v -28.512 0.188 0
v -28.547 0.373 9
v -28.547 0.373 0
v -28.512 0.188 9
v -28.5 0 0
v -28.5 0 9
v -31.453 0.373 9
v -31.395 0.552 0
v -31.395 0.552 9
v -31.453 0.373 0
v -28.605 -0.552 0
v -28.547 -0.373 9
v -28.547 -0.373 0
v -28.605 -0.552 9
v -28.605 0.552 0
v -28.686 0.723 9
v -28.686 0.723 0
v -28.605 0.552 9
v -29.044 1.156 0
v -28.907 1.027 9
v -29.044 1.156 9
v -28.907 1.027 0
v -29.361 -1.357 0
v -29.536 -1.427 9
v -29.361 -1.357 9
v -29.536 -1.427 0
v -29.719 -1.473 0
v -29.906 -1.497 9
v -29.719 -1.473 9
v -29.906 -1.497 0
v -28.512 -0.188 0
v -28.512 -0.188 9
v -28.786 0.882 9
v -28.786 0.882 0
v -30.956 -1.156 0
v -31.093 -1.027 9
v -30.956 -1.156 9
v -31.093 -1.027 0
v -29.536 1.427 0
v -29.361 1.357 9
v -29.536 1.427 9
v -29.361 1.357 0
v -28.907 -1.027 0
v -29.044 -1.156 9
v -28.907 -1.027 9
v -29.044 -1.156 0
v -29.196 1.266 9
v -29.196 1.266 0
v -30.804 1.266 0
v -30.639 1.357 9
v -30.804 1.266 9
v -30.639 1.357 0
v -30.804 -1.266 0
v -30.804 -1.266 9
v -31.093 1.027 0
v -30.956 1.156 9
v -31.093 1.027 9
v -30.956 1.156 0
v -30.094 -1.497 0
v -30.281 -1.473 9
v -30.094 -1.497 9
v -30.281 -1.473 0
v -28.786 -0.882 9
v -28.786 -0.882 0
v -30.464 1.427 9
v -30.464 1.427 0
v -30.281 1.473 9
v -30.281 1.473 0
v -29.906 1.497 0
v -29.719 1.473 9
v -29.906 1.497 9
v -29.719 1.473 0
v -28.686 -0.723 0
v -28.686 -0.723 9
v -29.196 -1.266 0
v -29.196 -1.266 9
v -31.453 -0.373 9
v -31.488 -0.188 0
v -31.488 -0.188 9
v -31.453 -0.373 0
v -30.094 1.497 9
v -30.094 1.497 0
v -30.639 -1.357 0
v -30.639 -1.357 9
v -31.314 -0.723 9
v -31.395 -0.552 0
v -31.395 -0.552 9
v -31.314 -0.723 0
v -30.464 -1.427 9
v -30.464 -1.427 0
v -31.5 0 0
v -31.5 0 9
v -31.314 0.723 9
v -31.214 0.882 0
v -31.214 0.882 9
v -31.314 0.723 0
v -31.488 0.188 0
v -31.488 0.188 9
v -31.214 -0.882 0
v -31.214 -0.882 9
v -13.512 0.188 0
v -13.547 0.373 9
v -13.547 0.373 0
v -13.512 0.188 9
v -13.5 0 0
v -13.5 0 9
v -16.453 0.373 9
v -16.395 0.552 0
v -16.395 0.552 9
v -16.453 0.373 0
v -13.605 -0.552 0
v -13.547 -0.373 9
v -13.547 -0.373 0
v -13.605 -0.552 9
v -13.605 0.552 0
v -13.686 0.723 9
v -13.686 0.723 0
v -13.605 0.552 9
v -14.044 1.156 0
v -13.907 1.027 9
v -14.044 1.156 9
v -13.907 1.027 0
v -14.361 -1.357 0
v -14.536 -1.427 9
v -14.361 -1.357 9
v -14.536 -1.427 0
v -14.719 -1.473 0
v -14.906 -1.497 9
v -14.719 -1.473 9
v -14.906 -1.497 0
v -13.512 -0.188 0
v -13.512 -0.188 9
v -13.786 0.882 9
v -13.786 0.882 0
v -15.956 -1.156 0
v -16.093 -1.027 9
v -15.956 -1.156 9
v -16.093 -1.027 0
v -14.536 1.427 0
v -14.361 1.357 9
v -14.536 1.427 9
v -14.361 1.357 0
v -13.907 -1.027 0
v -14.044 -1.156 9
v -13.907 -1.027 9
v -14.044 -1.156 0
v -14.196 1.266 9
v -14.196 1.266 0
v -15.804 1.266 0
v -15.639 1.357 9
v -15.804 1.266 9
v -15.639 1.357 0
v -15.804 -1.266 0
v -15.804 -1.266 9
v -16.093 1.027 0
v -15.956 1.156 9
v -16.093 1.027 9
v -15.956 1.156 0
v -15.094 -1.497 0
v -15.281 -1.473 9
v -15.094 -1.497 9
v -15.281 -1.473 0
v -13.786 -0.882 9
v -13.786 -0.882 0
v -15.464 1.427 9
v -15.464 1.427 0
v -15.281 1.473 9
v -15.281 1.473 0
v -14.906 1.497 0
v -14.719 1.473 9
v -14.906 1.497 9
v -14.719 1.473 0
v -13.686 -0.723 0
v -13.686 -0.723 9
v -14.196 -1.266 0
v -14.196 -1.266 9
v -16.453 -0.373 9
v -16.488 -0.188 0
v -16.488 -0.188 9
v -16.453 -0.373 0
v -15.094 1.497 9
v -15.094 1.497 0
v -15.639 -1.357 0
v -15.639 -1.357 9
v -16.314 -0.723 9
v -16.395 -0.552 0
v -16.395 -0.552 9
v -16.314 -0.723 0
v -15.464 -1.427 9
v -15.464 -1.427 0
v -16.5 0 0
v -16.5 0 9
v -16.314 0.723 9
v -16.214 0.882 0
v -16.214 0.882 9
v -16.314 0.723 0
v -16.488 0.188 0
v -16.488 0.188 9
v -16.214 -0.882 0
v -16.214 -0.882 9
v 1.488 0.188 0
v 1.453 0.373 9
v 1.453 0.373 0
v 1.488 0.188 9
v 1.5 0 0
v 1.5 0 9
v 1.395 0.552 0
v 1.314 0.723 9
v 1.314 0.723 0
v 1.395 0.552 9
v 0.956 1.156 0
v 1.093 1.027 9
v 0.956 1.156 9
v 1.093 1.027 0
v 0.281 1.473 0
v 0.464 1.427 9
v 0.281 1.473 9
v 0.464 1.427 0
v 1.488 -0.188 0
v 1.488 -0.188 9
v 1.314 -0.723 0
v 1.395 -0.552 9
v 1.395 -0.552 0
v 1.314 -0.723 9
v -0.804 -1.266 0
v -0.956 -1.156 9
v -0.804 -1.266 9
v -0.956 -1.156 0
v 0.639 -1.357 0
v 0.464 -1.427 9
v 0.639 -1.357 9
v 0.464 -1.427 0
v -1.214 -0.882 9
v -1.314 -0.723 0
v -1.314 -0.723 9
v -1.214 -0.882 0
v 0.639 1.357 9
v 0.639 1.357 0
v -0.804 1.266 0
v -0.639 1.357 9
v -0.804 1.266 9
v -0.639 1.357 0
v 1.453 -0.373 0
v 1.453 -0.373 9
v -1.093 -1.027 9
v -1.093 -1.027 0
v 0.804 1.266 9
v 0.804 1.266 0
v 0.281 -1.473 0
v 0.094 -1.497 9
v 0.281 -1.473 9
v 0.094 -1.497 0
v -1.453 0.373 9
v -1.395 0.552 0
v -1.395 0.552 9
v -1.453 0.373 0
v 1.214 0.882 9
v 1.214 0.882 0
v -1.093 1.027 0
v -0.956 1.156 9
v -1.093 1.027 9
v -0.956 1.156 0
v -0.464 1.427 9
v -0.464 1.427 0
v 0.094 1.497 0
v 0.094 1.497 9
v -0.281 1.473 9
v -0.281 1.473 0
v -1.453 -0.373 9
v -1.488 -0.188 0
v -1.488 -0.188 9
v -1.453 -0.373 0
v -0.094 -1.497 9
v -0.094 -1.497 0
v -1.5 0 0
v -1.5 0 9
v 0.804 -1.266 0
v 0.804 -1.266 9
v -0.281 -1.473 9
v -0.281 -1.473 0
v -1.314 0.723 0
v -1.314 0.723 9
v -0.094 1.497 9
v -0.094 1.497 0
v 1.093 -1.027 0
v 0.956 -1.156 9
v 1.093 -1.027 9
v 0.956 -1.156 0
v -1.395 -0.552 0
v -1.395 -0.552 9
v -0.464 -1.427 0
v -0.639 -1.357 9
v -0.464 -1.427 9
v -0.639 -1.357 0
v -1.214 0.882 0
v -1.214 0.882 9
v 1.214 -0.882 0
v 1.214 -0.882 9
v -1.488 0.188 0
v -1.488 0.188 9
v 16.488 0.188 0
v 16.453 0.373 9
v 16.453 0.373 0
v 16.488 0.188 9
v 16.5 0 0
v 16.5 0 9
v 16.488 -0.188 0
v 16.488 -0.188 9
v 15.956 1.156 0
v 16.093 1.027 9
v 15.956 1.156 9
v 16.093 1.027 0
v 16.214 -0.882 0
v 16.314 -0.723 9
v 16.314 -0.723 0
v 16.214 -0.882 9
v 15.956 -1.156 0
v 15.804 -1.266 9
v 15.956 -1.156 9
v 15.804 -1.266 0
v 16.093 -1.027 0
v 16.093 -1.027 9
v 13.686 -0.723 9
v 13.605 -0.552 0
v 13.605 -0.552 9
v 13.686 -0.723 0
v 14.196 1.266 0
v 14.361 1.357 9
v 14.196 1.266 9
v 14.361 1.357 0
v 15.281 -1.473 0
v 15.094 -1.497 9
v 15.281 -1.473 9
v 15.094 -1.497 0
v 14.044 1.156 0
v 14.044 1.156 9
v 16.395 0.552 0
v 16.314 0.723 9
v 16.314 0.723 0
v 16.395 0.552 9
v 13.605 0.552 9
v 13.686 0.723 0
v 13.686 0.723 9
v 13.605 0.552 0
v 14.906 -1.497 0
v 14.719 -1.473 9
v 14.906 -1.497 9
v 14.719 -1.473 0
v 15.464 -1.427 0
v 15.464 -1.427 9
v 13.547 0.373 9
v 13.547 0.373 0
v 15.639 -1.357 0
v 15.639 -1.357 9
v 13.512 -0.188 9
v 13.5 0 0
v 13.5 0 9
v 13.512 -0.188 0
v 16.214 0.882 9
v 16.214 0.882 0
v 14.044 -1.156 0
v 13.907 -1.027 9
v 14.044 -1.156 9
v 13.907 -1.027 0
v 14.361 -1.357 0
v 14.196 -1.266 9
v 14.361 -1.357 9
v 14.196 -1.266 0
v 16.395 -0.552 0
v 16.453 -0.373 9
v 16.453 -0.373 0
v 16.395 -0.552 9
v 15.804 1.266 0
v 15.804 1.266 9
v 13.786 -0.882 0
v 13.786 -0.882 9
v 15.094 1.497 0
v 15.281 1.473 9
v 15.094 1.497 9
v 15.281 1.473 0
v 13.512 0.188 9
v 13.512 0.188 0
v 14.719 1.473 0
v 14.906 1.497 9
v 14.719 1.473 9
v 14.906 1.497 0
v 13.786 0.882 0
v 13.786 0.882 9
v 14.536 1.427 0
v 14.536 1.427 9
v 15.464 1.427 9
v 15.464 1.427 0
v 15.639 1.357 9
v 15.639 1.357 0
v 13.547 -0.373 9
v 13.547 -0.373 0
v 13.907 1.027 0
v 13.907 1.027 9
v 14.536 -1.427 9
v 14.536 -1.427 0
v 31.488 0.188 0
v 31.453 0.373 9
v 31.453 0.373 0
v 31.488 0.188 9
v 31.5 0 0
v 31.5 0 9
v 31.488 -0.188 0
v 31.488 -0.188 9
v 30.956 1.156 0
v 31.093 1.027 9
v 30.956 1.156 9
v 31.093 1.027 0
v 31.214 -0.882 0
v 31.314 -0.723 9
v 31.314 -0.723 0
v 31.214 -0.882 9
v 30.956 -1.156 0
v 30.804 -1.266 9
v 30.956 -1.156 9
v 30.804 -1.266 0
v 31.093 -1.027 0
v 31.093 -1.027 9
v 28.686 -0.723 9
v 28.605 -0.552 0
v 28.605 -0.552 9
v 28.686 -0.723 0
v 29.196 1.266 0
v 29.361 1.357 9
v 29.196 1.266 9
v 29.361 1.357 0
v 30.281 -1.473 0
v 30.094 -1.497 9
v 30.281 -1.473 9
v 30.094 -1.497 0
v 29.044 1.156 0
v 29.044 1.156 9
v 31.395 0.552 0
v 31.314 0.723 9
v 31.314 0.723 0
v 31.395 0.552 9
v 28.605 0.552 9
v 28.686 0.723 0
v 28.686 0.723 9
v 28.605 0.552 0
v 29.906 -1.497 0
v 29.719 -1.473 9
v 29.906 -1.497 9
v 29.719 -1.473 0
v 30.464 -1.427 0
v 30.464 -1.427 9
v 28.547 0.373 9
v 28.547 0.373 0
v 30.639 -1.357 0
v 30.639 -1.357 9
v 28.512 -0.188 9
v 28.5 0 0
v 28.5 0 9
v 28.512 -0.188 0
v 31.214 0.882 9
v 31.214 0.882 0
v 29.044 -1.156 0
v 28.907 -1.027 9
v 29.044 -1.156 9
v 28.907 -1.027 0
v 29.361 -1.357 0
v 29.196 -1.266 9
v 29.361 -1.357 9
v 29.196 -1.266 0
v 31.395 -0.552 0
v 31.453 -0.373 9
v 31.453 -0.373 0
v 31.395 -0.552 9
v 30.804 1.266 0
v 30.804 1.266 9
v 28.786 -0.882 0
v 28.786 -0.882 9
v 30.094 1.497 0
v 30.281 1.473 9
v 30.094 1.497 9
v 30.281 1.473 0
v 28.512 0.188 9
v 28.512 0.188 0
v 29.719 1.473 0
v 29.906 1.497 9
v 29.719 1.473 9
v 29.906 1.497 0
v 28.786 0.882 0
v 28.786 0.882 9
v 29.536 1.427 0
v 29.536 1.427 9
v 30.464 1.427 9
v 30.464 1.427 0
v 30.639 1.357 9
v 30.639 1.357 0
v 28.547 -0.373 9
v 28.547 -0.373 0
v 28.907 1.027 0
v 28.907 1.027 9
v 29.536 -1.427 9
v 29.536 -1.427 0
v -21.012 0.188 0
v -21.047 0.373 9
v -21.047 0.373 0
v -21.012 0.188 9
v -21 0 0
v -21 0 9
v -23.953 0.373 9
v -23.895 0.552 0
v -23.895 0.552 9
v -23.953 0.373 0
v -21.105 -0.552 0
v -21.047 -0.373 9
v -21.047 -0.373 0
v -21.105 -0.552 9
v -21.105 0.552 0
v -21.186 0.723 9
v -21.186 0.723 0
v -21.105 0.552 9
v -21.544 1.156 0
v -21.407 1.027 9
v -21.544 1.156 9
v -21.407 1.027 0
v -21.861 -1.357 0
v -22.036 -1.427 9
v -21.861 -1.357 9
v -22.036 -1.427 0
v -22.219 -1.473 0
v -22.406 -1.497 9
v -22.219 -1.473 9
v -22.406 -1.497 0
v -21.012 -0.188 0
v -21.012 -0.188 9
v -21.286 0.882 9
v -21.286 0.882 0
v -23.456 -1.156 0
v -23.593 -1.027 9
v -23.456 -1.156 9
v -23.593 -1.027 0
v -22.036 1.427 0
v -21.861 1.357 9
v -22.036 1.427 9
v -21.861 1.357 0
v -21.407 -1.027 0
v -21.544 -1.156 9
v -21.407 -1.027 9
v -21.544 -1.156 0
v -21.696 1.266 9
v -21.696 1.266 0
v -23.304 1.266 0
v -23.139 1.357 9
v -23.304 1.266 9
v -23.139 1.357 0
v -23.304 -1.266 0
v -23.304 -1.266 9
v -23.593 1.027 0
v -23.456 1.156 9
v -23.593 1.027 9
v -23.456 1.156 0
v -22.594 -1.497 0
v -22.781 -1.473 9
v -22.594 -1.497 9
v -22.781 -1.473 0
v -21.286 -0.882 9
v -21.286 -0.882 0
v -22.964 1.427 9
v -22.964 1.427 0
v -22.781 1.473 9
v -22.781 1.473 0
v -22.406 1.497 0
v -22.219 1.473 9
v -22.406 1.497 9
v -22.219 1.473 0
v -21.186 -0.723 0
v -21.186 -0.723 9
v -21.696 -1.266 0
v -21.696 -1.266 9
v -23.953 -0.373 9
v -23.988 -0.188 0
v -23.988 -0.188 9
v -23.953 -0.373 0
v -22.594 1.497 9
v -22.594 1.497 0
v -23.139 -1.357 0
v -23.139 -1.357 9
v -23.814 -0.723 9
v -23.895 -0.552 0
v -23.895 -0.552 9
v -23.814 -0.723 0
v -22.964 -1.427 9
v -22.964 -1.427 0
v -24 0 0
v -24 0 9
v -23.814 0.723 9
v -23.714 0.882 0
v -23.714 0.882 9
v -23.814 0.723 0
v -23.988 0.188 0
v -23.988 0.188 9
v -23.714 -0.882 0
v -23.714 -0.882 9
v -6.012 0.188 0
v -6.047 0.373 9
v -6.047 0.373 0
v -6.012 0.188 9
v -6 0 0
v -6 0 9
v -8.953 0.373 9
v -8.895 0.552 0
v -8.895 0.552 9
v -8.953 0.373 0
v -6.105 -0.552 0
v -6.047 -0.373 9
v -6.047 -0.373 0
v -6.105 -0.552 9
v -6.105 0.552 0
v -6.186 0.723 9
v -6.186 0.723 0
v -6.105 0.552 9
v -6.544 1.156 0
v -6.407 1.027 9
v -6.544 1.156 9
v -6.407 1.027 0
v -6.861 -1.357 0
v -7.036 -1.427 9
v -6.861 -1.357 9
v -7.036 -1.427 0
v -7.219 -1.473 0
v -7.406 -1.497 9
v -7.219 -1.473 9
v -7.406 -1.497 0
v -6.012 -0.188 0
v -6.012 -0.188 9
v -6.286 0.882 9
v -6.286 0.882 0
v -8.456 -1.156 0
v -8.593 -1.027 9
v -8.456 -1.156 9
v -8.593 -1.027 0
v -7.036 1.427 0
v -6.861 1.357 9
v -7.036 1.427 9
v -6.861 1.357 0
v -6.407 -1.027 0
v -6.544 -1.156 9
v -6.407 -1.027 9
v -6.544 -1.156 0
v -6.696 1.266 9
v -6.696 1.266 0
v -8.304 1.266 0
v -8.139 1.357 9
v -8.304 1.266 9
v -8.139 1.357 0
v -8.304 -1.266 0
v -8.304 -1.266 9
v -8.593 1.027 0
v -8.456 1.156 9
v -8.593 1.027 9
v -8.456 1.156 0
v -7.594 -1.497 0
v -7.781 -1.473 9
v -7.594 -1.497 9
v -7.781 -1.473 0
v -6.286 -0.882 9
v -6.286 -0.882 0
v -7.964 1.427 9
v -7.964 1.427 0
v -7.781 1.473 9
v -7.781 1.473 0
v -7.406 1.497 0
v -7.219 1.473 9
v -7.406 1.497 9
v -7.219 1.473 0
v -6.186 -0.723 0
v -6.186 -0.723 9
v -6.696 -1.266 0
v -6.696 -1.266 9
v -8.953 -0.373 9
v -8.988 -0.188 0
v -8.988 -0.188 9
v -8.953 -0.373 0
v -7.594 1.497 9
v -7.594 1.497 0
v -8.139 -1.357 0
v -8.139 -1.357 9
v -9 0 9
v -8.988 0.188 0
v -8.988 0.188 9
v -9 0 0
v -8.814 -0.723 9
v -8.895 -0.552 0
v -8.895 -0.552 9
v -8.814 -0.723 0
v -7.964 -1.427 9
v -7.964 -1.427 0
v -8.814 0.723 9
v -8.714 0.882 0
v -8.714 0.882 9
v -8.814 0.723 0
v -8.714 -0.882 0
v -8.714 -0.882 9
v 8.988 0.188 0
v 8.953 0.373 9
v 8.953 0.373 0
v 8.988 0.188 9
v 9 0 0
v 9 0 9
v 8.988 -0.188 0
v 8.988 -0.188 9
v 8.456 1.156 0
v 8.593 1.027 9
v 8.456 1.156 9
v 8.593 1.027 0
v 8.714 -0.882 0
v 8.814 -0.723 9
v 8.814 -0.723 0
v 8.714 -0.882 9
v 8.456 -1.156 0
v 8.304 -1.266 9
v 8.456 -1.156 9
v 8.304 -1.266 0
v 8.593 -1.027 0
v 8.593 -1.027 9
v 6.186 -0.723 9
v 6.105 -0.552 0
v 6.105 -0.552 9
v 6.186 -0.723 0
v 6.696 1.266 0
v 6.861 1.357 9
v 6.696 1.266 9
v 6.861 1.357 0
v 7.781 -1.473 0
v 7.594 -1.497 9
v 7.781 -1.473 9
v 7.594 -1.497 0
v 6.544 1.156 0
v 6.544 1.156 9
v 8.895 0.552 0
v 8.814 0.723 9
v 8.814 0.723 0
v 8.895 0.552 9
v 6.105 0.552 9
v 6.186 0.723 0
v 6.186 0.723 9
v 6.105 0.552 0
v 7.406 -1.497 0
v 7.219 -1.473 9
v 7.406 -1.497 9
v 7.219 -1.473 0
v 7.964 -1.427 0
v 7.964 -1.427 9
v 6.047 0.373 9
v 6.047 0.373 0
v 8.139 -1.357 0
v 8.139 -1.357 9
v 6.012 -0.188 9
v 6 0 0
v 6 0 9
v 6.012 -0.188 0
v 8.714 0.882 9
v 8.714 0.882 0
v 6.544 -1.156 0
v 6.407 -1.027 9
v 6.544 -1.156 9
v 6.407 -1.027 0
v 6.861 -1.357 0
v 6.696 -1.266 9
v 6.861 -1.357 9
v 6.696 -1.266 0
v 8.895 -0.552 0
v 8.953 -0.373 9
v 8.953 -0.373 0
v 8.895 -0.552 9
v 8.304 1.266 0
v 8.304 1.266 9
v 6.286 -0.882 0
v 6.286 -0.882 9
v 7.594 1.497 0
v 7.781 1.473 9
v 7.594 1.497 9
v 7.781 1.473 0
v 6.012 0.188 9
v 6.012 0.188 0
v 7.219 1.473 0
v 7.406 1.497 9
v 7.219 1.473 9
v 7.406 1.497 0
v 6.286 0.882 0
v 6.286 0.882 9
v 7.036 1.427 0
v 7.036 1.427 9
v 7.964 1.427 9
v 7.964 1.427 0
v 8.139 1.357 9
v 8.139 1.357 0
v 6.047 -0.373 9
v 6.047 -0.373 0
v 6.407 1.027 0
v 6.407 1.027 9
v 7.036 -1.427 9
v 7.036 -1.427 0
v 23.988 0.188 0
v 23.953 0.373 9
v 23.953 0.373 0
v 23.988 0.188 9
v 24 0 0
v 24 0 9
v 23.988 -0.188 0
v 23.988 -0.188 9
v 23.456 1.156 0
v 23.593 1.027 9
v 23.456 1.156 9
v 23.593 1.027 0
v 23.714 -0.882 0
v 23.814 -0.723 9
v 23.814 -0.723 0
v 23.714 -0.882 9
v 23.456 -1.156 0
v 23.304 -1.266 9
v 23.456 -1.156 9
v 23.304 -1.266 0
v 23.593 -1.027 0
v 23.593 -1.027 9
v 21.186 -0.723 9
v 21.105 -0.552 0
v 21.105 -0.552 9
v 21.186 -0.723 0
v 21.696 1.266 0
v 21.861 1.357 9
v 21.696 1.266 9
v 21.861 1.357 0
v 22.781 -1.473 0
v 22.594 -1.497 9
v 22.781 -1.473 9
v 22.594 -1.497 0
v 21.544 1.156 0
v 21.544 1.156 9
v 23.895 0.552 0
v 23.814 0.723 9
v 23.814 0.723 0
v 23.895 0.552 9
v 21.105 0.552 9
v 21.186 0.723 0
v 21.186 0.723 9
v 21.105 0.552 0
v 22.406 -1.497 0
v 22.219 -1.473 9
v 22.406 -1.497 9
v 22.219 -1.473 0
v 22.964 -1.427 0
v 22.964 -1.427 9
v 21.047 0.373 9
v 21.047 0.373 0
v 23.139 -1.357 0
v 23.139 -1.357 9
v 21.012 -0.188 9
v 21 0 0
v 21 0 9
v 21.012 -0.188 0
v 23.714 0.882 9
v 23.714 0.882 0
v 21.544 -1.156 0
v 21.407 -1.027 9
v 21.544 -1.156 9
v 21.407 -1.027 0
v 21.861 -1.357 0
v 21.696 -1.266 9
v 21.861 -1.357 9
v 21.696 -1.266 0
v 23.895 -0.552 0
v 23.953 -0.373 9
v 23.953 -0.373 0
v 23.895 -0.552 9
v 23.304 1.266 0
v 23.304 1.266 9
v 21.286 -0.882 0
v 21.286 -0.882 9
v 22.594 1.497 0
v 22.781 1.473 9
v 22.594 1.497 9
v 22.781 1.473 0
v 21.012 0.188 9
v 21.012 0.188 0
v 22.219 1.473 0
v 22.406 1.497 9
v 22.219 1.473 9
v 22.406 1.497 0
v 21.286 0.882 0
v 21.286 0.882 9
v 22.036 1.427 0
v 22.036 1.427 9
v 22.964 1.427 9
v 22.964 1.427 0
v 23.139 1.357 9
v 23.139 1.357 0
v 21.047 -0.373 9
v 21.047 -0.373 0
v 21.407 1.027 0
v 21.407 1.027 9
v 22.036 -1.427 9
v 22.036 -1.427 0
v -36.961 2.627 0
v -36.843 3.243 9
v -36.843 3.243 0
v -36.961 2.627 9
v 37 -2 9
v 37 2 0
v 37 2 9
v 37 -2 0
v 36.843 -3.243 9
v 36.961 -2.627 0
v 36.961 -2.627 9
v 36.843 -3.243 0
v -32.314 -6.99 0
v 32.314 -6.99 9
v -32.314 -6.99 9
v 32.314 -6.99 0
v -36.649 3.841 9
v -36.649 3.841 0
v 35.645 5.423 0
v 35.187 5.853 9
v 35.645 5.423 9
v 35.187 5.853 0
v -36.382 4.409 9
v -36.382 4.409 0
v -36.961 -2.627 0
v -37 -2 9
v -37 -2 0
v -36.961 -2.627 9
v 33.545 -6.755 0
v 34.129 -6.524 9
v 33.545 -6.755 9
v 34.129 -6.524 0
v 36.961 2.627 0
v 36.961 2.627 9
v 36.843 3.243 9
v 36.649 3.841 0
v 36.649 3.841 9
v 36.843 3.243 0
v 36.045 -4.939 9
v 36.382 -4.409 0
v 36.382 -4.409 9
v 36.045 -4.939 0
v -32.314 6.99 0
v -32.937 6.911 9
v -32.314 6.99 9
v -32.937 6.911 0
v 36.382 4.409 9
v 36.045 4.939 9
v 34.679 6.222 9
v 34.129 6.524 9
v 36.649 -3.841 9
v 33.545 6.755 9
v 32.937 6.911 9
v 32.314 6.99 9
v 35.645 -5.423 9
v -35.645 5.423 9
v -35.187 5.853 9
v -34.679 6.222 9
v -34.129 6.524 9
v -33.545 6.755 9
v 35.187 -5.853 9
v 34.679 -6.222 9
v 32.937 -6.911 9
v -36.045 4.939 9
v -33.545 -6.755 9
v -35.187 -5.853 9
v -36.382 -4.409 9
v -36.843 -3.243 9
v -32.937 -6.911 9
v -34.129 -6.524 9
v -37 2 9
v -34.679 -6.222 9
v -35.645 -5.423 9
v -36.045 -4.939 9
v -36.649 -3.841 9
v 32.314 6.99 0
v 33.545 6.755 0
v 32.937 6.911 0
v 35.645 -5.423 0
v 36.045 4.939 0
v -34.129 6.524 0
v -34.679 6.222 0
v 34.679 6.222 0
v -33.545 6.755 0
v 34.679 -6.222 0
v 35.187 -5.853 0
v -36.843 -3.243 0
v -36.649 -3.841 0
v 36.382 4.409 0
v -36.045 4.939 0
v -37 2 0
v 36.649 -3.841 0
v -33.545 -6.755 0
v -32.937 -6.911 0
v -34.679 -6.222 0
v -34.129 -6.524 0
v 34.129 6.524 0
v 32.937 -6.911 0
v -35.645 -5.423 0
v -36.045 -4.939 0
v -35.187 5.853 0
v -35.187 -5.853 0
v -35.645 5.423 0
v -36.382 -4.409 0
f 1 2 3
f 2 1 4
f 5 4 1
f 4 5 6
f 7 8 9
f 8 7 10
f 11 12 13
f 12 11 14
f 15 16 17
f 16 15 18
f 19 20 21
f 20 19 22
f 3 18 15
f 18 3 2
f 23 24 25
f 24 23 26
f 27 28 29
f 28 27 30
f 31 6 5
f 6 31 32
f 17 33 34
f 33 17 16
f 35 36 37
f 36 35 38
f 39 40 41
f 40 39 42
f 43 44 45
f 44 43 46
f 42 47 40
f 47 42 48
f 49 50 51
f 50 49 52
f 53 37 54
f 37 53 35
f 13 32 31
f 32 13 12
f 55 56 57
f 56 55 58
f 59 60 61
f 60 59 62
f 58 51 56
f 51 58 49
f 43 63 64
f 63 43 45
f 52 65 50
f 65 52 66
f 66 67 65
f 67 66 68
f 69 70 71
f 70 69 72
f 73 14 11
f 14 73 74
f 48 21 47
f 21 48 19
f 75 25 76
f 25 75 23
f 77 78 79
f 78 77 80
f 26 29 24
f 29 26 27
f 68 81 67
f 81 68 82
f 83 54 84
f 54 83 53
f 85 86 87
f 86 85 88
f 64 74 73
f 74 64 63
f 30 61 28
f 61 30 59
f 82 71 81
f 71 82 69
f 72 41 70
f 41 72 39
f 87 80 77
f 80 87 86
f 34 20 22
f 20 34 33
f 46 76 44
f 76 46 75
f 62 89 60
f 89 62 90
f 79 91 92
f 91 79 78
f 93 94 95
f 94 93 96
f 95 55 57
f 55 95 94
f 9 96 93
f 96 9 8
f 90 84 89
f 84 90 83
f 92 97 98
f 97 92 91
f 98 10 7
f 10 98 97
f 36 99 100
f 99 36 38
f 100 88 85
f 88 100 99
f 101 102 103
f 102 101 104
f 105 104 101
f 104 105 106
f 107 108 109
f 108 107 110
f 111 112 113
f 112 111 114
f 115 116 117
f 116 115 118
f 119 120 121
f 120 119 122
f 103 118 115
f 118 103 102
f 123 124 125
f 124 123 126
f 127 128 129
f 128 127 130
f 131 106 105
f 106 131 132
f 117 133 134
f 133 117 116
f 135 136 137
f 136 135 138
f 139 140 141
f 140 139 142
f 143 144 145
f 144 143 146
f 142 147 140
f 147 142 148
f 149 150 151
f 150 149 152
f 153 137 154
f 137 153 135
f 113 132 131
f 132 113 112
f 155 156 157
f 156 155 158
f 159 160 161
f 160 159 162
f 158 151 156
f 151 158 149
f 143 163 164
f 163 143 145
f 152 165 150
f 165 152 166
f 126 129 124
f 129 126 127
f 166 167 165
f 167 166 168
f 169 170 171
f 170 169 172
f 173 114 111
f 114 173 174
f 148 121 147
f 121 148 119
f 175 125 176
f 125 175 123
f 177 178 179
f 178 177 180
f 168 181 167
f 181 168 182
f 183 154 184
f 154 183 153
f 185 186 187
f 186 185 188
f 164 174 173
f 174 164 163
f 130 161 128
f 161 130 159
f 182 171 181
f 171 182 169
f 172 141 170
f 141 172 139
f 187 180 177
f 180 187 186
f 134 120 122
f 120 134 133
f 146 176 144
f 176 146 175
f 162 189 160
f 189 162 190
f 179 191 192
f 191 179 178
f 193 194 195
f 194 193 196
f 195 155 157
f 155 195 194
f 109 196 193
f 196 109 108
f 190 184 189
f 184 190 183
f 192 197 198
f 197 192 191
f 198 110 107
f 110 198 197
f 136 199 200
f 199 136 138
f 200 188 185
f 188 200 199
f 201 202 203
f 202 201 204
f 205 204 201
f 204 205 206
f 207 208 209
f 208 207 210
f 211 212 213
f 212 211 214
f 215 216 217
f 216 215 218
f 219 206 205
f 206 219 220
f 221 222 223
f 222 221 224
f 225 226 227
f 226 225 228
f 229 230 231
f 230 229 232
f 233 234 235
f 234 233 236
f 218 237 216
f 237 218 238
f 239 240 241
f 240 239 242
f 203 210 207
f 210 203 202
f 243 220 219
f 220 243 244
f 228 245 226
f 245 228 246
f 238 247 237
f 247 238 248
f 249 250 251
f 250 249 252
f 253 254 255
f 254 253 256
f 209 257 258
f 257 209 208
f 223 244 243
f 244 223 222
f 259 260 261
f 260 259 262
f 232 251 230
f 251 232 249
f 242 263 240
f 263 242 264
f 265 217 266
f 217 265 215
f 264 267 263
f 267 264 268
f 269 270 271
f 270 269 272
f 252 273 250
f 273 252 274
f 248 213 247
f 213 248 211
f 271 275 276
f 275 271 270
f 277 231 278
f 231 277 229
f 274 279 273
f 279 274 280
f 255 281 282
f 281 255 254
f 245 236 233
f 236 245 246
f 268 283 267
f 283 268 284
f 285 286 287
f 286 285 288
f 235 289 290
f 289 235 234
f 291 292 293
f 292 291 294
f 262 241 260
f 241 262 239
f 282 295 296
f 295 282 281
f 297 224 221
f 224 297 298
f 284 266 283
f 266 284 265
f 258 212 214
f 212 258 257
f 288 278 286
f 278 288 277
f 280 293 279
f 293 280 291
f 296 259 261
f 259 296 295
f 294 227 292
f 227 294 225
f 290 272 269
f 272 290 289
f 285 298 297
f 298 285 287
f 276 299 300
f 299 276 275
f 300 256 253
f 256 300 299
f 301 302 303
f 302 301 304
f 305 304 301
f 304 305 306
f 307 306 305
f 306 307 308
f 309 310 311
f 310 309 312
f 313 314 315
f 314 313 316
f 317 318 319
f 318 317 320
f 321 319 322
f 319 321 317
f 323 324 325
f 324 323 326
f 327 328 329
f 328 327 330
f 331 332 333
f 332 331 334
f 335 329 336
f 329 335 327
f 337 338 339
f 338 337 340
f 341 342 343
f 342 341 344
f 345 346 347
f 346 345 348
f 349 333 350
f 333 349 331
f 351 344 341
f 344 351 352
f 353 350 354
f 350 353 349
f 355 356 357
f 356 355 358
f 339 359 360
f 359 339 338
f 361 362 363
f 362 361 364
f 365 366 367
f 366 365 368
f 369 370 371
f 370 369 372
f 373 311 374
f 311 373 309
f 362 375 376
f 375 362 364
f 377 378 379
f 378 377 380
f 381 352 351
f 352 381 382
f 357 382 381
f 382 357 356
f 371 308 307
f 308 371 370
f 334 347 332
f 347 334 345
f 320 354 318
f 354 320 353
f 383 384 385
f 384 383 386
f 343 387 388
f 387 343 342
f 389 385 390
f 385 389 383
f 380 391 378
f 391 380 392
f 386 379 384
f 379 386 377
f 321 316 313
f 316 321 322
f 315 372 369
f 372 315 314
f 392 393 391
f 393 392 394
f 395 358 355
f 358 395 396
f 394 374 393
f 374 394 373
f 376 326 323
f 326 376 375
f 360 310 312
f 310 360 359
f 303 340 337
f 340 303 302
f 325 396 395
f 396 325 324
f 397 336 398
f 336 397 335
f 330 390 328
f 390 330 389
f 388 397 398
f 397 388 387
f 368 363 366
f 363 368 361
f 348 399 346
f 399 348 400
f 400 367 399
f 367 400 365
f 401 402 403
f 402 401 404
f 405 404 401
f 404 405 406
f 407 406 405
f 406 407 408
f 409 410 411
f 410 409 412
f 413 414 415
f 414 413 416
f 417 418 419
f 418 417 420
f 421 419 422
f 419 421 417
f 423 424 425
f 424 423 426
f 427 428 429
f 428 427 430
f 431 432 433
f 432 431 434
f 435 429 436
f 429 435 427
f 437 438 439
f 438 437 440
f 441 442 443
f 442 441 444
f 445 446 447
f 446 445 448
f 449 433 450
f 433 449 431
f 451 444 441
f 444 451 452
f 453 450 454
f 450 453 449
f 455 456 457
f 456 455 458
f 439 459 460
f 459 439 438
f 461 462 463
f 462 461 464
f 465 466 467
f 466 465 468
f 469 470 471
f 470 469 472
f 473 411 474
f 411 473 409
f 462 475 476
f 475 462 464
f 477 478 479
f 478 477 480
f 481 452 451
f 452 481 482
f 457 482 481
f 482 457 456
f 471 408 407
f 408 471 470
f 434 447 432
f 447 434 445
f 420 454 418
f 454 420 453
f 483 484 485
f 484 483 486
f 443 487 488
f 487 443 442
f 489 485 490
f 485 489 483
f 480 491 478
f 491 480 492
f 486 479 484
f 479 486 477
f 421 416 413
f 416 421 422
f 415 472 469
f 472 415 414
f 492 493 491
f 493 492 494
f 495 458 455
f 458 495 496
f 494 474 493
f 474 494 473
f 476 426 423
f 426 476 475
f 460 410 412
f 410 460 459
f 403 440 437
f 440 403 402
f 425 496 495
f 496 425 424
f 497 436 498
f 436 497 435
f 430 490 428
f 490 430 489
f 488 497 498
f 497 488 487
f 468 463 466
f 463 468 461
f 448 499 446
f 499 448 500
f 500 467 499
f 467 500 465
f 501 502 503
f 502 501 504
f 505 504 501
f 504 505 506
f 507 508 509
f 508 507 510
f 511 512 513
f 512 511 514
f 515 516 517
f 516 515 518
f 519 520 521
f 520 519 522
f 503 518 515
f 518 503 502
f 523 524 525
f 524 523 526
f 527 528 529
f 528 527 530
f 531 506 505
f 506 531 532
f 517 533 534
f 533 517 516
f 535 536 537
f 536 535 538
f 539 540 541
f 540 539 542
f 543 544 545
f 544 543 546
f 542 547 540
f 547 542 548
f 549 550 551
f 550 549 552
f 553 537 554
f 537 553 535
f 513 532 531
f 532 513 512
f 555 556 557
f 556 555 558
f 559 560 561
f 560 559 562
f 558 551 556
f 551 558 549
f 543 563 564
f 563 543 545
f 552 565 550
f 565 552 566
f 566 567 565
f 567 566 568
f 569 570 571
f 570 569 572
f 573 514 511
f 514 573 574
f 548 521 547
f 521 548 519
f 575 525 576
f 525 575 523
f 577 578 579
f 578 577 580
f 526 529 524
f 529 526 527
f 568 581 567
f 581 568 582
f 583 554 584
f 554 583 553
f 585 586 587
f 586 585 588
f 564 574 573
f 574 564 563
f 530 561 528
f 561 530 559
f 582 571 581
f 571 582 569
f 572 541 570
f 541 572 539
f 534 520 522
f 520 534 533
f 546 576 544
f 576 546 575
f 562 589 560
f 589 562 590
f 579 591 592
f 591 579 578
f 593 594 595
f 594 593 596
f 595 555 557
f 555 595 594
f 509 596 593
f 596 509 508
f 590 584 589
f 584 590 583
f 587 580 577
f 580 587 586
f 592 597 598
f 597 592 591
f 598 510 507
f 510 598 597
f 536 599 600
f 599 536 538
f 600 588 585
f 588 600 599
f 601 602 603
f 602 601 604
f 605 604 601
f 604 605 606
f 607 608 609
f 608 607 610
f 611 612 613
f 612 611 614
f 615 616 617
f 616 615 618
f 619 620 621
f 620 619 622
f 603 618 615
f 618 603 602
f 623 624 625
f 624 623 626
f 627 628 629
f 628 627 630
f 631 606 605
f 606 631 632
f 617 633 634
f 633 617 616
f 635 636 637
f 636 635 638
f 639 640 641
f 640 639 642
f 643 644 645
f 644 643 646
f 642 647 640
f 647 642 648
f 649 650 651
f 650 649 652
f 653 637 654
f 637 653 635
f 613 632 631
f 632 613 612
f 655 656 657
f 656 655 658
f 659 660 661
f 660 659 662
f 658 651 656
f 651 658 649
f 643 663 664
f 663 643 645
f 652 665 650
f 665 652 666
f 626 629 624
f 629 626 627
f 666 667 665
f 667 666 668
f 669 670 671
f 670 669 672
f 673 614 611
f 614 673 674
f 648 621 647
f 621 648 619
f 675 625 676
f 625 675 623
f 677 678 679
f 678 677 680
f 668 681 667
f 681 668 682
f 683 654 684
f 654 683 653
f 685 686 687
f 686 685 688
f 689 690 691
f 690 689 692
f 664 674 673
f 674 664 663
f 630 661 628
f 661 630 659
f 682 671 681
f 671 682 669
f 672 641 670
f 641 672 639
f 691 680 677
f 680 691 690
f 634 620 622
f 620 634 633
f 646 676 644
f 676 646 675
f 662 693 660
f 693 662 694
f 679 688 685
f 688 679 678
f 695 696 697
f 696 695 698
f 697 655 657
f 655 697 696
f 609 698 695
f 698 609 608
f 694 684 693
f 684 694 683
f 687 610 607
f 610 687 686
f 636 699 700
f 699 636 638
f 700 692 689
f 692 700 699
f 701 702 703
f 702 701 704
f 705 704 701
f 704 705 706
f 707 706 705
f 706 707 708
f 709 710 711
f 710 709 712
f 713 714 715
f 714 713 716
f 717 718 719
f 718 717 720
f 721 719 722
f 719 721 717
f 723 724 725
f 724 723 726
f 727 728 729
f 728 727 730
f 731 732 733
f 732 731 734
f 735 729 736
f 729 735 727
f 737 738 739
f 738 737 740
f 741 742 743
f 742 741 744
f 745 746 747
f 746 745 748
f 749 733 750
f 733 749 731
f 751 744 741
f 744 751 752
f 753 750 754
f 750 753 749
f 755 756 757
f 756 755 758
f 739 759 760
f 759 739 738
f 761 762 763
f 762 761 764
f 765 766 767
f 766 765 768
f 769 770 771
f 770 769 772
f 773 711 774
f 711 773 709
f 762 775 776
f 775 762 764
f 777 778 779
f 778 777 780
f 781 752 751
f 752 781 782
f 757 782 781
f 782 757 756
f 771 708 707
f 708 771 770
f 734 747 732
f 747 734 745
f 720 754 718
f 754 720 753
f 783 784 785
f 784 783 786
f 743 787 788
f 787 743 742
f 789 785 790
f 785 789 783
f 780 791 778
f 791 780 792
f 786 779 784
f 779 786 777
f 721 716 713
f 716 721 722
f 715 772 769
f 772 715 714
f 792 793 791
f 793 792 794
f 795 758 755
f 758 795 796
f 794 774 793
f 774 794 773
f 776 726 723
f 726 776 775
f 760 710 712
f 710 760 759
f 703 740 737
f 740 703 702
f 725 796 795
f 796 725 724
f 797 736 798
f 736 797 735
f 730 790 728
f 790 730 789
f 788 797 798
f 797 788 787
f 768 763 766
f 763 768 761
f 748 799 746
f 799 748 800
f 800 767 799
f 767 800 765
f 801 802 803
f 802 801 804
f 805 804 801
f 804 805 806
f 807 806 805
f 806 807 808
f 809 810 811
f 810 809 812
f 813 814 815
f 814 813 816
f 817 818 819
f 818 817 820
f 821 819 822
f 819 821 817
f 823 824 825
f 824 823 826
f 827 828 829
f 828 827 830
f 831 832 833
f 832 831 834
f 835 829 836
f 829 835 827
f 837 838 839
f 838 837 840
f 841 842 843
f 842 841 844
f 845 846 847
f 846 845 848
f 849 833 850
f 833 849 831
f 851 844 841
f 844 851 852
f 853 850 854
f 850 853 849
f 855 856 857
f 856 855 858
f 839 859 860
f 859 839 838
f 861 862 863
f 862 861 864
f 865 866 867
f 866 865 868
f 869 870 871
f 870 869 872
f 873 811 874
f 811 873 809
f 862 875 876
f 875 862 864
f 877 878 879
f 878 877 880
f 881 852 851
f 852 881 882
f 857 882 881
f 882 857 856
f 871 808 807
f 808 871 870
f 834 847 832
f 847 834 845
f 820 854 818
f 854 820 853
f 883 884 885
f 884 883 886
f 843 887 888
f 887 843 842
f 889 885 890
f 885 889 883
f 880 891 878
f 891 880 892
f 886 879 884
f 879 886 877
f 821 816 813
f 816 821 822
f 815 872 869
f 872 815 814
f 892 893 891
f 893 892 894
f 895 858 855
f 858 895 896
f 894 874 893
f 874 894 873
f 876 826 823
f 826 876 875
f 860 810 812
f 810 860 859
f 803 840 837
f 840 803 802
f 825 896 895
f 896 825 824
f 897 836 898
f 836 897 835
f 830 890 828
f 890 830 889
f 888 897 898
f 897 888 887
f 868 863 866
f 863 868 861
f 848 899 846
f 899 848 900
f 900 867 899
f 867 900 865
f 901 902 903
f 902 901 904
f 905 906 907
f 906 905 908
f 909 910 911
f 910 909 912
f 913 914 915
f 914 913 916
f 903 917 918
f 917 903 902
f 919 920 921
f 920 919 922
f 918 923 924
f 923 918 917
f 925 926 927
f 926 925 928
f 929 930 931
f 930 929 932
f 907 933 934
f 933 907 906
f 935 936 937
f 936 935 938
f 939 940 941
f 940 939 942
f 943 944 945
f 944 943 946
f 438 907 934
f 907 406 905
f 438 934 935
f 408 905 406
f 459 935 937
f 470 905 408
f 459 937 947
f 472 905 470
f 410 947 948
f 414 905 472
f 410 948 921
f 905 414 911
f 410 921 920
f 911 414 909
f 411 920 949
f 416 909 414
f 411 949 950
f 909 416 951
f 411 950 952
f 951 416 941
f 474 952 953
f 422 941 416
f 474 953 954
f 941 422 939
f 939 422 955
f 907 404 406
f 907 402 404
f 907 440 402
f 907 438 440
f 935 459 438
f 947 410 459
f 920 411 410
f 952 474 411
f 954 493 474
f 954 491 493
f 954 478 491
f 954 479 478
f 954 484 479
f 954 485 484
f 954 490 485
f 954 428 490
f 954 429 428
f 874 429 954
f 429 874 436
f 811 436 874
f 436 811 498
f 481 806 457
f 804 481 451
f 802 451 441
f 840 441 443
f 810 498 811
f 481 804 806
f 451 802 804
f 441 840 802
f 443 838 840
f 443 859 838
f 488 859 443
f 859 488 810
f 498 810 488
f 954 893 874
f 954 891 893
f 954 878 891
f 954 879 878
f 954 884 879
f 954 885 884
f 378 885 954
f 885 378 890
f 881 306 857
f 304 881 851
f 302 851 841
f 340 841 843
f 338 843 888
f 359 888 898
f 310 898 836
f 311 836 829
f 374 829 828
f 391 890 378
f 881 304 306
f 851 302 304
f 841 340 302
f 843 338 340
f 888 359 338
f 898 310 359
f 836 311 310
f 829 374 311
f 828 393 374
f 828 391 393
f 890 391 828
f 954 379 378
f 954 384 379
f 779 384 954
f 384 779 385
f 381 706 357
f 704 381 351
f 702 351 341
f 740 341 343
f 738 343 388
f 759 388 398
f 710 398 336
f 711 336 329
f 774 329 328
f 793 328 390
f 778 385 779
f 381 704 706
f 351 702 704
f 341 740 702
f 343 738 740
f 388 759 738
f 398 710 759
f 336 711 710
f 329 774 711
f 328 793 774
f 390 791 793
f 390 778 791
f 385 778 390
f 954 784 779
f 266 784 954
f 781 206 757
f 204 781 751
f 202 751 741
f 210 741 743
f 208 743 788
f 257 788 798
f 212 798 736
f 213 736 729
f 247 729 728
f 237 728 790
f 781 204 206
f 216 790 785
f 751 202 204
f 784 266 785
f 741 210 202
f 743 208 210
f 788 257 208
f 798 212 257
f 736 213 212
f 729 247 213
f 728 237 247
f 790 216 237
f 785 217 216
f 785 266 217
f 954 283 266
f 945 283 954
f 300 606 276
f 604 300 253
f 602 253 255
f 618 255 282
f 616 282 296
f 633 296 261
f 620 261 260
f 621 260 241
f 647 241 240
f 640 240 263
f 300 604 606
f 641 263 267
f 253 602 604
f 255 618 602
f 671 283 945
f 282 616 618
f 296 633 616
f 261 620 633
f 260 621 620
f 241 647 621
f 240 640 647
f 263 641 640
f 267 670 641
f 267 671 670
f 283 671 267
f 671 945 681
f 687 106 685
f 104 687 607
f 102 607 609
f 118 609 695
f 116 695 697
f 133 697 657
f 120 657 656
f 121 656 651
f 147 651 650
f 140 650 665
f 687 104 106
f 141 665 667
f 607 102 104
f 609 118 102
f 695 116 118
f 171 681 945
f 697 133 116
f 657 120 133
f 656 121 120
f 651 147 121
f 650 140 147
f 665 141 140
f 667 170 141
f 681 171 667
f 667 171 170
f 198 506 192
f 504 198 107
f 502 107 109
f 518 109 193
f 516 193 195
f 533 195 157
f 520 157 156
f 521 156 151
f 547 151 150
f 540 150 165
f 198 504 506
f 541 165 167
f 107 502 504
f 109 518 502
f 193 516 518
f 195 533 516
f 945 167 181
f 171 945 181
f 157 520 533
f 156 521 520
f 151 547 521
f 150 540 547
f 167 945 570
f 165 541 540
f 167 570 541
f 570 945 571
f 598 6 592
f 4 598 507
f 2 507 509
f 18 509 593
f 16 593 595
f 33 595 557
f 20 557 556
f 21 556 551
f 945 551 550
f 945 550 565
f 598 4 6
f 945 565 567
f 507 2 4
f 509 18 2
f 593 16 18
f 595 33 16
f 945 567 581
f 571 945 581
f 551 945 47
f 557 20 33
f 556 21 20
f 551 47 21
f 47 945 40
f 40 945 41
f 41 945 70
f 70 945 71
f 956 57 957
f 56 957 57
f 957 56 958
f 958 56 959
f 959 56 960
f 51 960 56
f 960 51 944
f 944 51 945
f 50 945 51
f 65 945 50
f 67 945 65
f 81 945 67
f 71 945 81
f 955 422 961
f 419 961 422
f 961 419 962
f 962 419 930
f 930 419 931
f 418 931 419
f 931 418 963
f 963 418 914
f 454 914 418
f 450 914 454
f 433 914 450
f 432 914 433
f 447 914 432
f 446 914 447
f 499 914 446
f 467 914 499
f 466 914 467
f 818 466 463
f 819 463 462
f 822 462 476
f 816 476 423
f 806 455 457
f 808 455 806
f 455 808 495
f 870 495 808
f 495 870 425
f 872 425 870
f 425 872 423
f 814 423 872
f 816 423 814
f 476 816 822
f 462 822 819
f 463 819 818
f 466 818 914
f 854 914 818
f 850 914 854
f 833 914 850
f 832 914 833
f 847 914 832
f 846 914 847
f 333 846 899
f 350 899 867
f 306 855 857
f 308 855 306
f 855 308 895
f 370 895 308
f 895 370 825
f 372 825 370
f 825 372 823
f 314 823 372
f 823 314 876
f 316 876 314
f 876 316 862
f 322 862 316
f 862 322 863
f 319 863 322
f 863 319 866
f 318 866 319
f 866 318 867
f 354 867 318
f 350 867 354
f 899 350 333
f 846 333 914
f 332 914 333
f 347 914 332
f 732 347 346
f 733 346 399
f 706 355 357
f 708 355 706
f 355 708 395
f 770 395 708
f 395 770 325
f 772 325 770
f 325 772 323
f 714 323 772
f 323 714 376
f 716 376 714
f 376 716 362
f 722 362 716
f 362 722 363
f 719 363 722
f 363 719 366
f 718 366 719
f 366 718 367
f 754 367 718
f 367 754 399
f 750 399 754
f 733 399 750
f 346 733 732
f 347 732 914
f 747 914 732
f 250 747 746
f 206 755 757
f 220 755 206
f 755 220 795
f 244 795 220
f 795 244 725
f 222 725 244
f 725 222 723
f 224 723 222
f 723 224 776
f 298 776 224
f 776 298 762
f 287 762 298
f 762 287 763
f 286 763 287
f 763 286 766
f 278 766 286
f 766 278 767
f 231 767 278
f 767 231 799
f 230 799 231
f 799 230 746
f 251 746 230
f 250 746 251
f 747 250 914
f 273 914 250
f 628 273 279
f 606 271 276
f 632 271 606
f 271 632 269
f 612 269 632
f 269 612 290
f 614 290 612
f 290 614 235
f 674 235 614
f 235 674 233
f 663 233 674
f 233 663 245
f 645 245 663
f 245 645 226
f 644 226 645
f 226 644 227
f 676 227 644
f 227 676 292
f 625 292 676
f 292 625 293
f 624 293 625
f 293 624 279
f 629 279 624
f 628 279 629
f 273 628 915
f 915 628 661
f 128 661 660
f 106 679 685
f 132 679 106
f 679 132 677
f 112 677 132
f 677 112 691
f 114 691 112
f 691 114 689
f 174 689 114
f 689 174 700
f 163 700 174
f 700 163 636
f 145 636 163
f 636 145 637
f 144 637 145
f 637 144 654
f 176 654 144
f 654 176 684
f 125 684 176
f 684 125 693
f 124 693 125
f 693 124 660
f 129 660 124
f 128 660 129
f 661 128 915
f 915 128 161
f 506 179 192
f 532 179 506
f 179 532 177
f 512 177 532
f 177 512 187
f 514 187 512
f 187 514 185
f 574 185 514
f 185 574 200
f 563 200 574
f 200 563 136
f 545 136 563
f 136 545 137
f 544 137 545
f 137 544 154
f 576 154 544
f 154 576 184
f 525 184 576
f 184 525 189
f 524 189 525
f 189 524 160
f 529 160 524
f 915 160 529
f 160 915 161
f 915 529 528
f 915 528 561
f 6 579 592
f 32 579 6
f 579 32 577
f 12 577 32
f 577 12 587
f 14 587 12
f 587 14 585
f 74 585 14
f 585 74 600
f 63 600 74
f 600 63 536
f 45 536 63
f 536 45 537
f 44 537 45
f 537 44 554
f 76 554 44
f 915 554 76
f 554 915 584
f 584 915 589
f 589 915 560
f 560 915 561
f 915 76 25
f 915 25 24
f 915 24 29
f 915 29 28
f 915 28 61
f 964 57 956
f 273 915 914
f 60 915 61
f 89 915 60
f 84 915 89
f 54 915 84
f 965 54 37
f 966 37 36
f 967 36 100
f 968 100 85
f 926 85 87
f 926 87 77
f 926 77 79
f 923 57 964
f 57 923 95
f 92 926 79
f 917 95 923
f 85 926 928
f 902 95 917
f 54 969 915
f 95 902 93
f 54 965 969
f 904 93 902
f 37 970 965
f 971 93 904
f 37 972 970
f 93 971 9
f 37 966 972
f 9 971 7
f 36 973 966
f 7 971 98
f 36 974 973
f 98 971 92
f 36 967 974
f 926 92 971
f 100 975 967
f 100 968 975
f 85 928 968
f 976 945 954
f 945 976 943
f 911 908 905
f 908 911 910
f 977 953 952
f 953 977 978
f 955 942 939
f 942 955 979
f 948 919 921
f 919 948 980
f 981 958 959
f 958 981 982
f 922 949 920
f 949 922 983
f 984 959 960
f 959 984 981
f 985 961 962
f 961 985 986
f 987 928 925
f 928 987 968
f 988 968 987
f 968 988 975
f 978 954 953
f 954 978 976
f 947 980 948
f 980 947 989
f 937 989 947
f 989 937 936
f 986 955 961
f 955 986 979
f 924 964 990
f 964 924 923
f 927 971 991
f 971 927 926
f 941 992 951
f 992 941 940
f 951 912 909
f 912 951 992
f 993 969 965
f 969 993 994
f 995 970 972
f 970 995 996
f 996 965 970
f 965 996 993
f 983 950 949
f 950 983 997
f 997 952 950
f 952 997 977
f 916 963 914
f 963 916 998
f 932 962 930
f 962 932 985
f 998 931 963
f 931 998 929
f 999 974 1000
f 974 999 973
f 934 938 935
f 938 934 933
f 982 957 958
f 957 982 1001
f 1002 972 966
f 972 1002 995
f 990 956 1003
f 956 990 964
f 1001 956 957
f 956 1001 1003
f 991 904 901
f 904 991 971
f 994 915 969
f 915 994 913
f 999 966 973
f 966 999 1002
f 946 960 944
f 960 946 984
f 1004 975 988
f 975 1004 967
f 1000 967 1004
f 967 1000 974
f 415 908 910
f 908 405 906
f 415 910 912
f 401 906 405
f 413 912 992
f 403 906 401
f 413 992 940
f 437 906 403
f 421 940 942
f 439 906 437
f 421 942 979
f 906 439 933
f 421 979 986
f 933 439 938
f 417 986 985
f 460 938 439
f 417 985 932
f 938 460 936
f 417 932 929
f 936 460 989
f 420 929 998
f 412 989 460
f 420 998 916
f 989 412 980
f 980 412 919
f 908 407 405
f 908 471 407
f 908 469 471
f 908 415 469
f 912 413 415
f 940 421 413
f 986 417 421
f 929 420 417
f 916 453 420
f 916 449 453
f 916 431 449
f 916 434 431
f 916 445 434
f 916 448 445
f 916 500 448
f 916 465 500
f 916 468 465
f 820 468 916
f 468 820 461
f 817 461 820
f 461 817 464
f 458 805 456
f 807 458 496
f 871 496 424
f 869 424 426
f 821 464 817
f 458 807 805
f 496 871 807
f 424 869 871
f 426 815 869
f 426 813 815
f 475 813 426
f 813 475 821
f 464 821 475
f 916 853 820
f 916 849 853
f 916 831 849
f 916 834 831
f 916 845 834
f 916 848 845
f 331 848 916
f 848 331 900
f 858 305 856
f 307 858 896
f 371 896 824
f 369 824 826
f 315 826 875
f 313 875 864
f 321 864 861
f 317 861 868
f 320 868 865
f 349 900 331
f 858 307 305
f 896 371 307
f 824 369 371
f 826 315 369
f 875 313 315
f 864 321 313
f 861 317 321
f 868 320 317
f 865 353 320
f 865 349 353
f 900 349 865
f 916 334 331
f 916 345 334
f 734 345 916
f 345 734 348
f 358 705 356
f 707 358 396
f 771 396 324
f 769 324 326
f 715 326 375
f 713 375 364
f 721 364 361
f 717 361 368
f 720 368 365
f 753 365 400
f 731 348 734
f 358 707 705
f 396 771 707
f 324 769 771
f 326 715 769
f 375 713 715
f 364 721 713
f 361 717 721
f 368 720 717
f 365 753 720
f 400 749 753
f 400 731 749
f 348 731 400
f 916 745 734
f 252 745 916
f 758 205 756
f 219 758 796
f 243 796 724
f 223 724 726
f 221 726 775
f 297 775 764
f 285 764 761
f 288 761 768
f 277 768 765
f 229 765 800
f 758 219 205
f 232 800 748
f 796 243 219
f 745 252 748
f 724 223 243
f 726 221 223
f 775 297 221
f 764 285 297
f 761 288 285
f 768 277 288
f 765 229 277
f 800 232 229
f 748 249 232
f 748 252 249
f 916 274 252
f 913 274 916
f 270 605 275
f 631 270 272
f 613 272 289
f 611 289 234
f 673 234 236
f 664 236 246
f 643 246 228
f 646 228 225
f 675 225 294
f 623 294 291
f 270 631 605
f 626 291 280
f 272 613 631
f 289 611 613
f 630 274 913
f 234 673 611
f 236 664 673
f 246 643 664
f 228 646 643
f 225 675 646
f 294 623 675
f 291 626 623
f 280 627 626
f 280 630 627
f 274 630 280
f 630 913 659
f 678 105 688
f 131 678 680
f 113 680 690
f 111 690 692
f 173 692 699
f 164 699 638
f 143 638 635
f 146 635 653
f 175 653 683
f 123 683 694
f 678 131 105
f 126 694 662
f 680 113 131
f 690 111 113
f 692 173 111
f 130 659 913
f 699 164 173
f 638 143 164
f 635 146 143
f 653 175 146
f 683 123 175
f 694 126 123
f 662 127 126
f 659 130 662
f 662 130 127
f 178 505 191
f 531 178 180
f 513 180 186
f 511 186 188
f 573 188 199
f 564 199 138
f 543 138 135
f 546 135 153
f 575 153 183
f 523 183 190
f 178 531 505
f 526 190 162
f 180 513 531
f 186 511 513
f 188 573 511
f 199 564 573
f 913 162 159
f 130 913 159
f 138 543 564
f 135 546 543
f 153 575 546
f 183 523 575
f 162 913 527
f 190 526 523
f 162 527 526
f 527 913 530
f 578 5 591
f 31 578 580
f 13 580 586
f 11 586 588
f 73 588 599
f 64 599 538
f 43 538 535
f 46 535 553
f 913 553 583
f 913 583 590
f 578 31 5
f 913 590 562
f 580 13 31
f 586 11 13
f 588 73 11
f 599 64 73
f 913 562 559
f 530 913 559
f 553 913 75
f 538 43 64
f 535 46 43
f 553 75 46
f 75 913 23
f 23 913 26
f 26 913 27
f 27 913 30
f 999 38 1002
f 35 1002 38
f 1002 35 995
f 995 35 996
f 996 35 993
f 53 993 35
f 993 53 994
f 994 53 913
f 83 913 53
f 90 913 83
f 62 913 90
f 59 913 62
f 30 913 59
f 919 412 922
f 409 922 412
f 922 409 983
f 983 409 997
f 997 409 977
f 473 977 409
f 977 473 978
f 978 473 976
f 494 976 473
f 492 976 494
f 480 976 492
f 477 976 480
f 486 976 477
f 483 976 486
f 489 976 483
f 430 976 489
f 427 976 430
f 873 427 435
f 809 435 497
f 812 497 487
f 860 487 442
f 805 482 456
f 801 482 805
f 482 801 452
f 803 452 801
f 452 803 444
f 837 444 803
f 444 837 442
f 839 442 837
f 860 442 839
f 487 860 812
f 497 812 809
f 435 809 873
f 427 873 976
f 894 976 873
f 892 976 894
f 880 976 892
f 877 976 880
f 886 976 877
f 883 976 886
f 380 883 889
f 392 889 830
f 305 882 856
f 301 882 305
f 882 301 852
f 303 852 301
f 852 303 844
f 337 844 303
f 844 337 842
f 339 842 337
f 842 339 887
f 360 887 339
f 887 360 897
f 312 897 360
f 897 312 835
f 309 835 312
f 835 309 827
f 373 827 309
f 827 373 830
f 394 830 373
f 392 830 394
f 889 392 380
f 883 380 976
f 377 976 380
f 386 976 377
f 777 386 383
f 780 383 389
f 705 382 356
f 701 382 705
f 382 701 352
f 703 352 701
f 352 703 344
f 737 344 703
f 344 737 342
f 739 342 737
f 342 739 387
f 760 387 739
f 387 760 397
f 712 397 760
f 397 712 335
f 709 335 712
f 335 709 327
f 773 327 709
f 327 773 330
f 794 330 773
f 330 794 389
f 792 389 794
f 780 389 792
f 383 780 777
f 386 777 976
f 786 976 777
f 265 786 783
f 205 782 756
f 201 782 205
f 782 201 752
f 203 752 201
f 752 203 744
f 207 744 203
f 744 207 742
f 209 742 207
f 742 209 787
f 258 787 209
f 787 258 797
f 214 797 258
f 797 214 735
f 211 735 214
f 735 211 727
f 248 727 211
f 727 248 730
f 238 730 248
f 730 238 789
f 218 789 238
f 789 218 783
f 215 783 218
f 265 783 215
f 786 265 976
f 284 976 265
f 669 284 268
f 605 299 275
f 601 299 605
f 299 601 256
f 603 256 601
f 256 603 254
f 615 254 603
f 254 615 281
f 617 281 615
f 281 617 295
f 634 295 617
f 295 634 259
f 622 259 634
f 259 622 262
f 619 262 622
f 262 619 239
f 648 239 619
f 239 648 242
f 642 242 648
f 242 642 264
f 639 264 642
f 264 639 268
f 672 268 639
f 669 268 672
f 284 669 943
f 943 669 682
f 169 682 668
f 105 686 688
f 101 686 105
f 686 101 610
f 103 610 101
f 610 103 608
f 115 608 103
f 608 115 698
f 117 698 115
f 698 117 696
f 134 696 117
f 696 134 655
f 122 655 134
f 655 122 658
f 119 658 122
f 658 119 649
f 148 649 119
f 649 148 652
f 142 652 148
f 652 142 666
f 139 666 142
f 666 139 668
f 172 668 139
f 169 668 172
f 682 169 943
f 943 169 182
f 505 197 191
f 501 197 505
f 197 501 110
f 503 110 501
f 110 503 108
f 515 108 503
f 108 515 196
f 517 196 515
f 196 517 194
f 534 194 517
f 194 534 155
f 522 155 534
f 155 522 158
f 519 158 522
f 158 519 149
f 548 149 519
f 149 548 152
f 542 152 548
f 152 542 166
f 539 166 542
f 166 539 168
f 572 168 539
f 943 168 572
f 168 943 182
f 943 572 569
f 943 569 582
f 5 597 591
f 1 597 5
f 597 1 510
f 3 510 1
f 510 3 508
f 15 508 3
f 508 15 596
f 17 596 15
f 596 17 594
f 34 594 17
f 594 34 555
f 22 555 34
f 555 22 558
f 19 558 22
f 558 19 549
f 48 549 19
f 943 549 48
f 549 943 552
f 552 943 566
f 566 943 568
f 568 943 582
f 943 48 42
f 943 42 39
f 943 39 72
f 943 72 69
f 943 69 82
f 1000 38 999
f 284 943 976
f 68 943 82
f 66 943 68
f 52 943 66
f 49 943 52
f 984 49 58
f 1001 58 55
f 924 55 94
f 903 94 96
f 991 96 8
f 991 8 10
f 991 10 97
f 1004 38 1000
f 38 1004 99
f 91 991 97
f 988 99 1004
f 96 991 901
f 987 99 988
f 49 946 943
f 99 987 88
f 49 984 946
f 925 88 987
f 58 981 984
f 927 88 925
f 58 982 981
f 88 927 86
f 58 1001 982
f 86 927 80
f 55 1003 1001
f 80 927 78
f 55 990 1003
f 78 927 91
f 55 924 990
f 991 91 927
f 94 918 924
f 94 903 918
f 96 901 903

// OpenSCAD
$fn = 50;


difference() {
	union() {
		hull() {
			translate(v = [-32.0000000000, 2.0000000000, 0]) {
				cylinder(h = 9, r = 5);
			}
			translate(v = [32.0000000000, 2.0000000000, 0]) {
				cylinder(h = 9, r = 5);
			}
			translate(v = [-32.0000000000, -2.0000000000, 0]) {
				cylinder(h = 9, r = 5);
			}
			translate(v = [32.0000000000, -2.0000000000, 0]) {
				cylinder(h = 9, r = 5);
			}
		}
	}
	union() {
		translate(v = [-30.0000000000, 0.0000000000, 0]) {
			translate(v = [0, 0, -100]) {
				cylinder(h = 200, r = 1.5000000000);
			}
		}
		translate(v = [-15.0000000000, 0.0000000000, 0]) {
			translate(v = [0, 0, -100]) {
				cylinder(h = 200, r = 1.5000000000);
			}
		}
		translate(v = [0, 0, -100]) {
			cylinder(h = 200, r = 1.5000000000);
		}
		translate(v = [15.0000000000, 0.0000000000, 0]) {
			translate(v = [0, 0, -100]) {
				cylinder(h = 200, r = 1.5000000000);
			}
		}
		translate(v = [30.0000000000, 0.0000000000, 0]) {
			translate(v = [0, 0, -100]) {
				cylinder(h = 200, r = 1.5000000000);
			}
		}
		translate(v = [-30.0000000000, 0.0000000000, 0]) {
			translate(v = [0, 0, -100]) {
				cylinder(h = 200, r = 1.5000000000);
			}
		}
		translate(v = [-22.5000000000, 0.0000000000, 0]) {
			translate(v = [0, 0, -100]) {
				cylinder(h = 200, r = 1.5000000000);
			}
		}
		translate(v = [-15.0000000000, 0.0000000000, 0]) {
			translate(v = [0, 0, -100]) {
				cylinder(h = 200, r = 1.5000000000);
			}
		}
		translate(v = [-7.5000000000, 0.0000000000, 0]) {
			translate(v = [0, 0, -100]) {
				cylinder(h = 200, r = 1.5000000000);
			}
		}
		translate(v = [0, 0, -100]) {
			cylinder(h = 200, r = 1.5000000000);
		}
		translate(v = [7.5000000000, 0.0000000000, 0]) {
			translate(v = [0, 0, -100]) {
				cylinder(h = 200, r = 1.5000000000);
			}
		}
		translate(v = [15.0000000000, 0.0000000000, 0]) {
			translate(v = [0, 0, -100]) {
				cylinder(h = 200, r = 1.5000000000);
			}
		}
		translate(v = [22.5000000000, 0.0000000000, 0]) {
			translate(v = [0, 0, -100]) {
				cylinder(h = 200, r = 1.5000000000);
			}
		}
		translate(v = [30.0000000000, 0.0000000000, 0]) {
			translate(v = [0, 0, -100]) {
				cylinder(h = 200, r = 1.5000000000);
			}
		}
	}
}
